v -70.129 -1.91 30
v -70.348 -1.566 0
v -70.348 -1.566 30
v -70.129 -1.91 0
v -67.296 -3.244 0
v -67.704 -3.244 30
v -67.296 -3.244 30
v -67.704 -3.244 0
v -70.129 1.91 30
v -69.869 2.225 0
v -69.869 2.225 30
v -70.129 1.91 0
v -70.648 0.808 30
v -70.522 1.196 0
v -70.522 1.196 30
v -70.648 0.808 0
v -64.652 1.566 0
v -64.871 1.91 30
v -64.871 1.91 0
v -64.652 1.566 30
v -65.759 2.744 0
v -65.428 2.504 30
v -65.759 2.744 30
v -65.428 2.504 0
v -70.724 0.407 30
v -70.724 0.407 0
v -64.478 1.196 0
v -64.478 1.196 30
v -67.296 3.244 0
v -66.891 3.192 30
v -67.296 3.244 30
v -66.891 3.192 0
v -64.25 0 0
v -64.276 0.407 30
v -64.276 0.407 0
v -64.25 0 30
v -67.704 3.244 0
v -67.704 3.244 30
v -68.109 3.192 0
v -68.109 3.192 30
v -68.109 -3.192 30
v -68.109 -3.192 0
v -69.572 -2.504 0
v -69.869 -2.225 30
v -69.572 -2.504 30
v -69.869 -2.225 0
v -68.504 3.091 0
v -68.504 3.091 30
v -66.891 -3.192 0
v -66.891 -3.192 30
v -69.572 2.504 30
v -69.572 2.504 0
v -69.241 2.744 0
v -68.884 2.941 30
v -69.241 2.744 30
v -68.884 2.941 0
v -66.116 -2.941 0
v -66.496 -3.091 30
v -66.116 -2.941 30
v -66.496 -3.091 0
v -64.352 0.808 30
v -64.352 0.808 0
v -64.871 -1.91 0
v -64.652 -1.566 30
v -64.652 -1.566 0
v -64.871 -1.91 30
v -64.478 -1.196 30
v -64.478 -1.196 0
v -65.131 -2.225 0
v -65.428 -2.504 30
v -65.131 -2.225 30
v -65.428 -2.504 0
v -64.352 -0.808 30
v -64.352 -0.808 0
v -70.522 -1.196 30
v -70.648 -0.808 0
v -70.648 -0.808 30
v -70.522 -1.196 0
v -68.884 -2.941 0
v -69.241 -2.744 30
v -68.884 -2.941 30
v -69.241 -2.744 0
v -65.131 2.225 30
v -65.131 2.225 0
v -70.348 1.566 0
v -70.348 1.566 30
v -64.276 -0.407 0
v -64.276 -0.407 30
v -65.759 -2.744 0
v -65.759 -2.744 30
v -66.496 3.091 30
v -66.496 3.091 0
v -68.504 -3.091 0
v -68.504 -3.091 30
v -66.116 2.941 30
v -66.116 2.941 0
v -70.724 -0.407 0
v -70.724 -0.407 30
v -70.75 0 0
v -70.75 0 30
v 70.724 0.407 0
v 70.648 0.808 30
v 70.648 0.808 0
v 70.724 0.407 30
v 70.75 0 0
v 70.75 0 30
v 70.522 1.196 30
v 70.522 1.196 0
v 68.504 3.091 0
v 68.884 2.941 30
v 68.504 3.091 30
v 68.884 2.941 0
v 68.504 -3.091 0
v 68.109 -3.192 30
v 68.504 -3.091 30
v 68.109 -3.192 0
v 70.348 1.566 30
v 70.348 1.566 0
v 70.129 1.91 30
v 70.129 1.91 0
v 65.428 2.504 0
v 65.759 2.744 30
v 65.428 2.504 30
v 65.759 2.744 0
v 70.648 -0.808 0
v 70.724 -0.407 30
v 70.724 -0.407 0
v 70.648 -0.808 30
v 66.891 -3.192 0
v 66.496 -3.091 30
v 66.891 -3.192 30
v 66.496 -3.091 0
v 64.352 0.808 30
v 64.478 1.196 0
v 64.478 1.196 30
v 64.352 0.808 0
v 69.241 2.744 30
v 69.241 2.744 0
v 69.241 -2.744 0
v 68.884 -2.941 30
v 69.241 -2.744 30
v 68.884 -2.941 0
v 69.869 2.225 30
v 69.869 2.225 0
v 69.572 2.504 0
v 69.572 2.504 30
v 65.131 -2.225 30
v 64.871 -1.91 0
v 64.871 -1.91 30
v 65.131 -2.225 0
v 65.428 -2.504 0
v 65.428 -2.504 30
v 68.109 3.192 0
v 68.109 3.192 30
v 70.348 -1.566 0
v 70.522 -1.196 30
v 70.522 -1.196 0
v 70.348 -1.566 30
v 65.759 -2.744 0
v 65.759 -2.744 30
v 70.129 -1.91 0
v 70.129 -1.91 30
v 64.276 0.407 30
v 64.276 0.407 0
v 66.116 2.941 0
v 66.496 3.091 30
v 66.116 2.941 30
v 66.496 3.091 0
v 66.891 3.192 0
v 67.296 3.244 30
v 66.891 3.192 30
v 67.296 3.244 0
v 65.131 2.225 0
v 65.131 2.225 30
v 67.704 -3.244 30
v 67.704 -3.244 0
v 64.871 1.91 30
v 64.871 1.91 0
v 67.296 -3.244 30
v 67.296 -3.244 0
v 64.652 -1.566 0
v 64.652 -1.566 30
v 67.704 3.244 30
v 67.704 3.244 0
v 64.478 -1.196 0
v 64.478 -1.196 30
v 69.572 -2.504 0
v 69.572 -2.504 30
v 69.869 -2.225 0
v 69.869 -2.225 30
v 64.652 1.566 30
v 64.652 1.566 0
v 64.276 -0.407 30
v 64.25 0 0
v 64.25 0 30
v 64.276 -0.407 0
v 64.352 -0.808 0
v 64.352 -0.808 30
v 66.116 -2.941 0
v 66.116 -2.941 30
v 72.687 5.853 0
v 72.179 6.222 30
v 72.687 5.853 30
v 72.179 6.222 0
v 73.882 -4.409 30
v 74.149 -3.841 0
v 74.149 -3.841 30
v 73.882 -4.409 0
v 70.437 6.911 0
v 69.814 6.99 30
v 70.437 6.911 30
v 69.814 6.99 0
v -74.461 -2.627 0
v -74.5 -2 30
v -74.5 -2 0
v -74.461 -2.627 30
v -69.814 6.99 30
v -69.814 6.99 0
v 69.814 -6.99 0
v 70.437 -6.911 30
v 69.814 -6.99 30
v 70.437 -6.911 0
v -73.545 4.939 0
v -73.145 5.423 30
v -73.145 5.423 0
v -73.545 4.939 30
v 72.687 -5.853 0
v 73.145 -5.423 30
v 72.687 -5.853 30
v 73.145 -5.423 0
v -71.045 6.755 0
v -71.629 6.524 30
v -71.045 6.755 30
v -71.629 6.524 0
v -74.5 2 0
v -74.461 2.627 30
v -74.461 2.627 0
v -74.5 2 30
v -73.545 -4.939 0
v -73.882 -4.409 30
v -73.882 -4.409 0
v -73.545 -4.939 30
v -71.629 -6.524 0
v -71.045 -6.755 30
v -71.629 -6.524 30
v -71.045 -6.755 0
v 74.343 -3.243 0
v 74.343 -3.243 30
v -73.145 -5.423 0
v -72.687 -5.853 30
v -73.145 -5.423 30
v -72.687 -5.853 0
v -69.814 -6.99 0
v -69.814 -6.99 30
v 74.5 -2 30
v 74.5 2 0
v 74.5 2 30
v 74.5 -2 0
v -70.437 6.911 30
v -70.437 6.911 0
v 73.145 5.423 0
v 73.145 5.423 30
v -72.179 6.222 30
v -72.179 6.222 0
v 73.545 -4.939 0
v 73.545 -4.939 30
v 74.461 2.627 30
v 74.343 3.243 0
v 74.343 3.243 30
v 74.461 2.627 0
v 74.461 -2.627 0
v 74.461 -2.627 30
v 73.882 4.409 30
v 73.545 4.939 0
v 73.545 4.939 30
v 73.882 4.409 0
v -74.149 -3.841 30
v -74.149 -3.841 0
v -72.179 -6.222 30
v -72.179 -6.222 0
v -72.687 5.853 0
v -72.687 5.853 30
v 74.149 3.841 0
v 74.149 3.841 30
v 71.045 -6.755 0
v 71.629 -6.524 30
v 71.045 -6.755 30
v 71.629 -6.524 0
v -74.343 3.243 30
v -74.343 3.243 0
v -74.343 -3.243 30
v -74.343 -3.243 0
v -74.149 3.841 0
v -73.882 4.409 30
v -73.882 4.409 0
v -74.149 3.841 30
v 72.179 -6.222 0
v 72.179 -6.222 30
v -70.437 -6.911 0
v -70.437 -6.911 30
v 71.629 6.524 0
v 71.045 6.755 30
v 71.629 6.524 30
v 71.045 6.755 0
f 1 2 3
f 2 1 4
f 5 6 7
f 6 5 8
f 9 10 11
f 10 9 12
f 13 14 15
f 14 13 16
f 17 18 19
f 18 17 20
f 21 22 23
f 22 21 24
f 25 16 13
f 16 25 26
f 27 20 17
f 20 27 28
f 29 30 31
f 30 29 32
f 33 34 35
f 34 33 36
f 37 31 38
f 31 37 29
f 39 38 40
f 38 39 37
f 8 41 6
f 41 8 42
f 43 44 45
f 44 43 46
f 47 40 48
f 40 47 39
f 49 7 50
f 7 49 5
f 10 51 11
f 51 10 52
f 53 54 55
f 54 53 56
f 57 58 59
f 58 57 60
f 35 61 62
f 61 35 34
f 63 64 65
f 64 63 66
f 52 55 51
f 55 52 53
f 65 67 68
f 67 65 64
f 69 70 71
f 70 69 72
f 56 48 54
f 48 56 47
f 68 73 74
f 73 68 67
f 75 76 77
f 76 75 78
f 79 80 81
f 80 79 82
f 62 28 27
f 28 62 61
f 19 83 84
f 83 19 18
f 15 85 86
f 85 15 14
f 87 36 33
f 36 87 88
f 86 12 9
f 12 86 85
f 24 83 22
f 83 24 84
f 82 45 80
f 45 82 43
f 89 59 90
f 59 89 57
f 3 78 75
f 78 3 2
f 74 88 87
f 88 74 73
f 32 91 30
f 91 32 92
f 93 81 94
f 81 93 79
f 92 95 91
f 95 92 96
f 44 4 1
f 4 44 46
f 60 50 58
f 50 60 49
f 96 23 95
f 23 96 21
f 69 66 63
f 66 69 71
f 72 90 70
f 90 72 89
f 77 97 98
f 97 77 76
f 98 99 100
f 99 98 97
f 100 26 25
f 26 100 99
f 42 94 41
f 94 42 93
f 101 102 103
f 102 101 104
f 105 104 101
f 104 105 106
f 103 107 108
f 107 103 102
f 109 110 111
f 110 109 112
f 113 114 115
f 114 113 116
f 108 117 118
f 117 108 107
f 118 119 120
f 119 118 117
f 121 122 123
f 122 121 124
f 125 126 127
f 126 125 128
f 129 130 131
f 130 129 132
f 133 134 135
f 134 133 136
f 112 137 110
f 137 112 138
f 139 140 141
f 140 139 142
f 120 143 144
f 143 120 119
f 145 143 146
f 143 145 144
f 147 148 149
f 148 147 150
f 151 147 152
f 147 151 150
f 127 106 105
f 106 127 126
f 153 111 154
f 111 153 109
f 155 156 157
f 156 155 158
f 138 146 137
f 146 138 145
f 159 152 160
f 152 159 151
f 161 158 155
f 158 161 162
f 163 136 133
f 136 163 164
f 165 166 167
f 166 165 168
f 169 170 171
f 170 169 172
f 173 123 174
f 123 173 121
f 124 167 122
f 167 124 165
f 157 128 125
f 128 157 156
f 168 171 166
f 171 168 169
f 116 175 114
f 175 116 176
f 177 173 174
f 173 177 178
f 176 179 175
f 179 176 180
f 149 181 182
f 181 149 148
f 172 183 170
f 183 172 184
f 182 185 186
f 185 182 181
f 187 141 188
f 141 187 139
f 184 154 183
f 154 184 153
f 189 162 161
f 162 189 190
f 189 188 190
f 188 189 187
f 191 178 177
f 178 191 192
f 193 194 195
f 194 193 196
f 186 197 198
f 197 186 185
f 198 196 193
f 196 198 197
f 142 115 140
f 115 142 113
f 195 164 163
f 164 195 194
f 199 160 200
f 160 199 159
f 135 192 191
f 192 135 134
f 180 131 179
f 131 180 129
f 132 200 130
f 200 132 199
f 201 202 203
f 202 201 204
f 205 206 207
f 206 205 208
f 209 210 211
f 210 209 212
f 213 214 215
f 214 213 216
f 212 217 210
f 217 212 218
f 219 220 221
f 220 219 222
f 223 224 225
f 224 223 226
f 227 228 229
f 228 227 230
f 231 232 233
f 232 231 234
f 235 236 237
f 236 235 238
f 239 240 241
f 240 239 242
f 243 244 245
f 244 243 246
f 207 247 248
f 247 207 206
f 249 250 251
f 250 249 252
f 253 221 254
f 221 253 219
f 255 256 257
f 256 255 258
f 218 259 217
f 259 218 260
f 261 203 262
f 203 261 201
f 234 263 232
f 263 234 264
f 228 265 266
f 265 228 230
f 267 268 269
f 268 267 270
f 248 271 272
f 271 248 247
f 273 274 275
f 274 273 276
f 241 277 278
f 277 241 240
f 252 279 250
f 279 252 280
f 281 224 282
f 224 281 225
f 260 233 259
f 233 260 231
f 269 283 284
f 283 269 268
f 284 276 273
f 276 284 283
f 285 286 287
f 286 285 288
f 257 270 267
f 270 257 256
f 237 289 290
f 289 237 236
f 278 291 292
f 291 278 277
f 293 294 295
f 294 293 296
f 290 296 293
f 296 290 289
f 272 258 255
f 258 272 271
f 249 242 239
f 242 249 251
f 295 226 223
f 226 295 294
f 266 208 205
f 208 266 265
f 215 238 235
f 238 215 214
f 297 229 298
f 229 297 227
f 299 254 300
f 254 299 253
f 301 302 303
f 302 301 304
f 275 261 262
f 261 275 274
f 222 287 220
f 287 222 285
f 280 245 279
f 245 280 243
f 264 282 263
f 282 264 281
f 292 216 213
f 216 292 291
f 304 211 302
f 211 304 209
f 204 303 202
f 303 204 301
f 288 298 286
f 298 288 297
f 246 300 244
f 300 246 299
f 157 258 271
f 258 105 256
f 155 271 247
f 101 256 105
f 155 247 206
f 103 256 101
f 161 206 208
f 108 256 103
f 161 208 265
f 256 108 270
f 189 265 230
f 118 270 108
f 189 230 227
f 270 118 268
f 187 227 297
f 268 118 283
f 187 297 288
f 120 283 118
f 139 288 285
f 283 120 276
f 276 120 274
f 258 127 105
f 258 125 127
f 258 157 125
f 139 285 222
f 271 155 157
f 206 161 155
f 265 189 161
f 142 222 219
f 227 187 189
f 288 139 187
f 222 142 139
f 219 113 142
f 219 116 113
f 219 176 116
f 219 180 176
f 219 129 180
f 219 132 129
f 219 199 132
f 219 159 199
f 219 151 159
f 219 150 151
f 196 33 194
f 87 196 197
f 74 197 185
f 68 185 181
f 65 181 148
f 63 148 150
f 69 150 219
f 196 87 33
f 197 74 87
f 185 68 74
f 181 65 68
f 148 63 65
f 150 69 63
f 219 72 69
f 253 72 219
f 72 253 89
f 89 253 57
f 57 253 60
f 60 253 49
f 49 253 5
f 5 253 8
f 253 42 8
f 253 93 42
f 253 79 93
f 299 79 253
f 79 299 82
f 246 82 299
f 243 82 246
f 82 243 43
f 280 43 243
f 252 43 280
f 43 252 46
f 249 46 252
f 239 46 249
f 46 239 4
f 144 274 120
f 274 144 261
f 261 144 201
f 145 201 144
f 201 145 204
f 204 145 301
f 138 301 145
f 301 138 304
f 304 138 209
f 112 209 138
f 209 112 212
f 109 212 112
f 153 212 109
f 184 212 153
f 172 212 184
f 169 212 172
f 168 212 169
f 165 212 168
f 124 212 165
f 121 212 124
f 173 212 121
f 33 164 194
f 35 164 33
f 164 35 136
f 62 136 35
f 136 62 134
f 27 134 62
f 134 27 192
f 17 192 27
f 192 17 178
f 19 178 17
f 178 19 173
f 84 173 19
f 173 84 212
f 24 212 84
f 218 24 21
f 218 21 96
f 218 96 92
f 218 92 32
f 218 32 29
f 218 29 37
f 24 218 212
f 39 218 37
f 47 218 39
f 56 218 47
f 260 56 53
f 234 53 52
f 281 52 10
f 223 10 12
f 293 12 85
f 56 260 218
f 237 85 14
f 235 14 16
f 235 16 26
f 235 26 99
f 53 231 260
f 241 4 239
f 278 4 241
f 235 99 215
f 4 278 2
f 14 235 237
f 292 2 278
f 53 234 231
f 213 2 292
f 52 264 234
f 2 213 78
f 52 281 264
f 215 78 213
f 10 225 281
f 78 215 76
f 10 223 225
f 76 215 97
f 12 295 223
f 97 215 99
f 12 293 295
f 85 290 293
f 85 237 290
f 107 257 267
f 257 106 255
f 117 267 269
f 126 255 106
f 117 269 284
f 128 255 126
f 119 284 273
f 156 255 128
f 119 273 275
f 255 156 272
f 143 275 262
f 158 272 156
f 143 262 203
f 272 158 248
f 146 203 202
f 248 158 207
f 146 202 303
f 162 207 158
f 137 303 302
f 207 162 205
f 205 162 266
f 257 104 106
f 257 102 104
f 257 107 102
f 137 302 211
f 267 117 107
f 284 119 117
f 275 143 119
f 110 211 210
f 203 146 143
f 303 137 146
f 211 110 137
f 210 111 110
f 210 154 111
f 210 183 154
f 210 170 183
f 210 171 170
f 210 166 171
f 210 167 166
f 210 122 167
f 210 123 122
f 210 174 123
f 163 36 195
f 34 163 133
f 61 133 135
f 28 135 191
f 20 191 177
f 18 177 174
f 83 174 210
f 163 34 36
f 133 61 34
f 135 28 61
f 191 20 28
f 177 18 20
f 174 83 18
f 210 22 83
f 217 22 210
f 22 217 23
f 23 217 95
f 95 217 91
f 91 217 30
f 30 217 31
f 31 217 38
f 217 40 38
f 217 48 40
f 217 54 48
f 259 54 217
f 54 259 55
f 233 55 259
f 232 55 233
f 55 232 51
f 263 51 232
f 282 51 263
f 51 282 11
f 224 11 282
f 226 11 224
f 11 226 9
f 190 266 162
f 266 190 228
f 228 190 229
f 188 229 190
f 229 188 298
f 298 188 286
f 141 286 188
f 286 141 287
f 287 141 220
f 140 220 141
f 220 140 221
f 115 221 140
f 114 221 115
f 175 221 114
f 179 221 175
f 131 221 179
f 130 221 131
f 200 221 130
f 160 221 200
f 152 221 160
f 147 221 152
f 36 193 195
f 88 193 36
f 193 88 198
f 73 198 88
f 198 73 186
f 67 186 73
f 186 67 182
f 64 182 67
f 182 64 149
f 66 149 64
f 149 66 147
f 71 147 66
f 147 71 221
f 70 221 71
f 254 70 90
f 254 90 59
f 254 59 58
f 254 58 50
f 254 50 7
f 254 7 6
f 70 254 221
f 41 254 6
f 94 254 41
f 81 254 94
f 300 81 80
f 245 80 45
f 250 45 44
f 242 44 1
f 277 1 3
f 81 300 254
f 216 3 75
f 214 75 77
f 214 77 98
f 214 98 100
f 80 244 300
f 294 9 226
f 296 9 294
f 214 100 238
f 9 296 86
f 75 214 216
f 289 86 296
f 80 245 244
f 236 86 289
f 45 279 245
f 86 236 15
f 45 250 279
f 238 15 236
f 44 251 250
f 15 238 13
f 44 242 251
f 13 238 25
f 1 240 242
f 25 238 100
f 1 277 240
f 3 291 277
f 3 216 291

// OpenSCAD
$fn = 50;


difference() {
	union() {
		hull() {
			translate(v = [-69.5000000000, 2.0000000000, 0]) {
				cylinder(h = 30, r = 5);
			}
			translate(v = [69.5000000000, 2.0000000000, 0]) {
				cylinder(h = 30, r = 5);
			}
			translate(v = [-69.5000000000, -2.0000000000, 0]) {
				cylinder(h = 30, r = 5);
			}
			translate(v = [69.5000000000, -2.0000000000, 0]) {
				cylinder(h = 30, r = 5);
			}
		}
	}
	union() {
		translate(v = [-67.5000000000, 0.0000000000, -100.0000000000]) {
			cylinder(h = 200, r = 3.2500000000);
		}
		translate(v = [-67.5000000000, 0.0000000000, -100.0000000000]) {
			cylinder(h = 200, r = 3.2500000000);
		}
		translate(v = [67.5000000000, 0.0000000000, -100.0000000000]) {
			cylinder(h = 200, r = 3.2500000000);
		}
		translate(v = [67.5000000000, 0.0000000000, -100.0000000000]) {
			cylinder(h = 200, r = 3.2500000000);
		}
	}
}
